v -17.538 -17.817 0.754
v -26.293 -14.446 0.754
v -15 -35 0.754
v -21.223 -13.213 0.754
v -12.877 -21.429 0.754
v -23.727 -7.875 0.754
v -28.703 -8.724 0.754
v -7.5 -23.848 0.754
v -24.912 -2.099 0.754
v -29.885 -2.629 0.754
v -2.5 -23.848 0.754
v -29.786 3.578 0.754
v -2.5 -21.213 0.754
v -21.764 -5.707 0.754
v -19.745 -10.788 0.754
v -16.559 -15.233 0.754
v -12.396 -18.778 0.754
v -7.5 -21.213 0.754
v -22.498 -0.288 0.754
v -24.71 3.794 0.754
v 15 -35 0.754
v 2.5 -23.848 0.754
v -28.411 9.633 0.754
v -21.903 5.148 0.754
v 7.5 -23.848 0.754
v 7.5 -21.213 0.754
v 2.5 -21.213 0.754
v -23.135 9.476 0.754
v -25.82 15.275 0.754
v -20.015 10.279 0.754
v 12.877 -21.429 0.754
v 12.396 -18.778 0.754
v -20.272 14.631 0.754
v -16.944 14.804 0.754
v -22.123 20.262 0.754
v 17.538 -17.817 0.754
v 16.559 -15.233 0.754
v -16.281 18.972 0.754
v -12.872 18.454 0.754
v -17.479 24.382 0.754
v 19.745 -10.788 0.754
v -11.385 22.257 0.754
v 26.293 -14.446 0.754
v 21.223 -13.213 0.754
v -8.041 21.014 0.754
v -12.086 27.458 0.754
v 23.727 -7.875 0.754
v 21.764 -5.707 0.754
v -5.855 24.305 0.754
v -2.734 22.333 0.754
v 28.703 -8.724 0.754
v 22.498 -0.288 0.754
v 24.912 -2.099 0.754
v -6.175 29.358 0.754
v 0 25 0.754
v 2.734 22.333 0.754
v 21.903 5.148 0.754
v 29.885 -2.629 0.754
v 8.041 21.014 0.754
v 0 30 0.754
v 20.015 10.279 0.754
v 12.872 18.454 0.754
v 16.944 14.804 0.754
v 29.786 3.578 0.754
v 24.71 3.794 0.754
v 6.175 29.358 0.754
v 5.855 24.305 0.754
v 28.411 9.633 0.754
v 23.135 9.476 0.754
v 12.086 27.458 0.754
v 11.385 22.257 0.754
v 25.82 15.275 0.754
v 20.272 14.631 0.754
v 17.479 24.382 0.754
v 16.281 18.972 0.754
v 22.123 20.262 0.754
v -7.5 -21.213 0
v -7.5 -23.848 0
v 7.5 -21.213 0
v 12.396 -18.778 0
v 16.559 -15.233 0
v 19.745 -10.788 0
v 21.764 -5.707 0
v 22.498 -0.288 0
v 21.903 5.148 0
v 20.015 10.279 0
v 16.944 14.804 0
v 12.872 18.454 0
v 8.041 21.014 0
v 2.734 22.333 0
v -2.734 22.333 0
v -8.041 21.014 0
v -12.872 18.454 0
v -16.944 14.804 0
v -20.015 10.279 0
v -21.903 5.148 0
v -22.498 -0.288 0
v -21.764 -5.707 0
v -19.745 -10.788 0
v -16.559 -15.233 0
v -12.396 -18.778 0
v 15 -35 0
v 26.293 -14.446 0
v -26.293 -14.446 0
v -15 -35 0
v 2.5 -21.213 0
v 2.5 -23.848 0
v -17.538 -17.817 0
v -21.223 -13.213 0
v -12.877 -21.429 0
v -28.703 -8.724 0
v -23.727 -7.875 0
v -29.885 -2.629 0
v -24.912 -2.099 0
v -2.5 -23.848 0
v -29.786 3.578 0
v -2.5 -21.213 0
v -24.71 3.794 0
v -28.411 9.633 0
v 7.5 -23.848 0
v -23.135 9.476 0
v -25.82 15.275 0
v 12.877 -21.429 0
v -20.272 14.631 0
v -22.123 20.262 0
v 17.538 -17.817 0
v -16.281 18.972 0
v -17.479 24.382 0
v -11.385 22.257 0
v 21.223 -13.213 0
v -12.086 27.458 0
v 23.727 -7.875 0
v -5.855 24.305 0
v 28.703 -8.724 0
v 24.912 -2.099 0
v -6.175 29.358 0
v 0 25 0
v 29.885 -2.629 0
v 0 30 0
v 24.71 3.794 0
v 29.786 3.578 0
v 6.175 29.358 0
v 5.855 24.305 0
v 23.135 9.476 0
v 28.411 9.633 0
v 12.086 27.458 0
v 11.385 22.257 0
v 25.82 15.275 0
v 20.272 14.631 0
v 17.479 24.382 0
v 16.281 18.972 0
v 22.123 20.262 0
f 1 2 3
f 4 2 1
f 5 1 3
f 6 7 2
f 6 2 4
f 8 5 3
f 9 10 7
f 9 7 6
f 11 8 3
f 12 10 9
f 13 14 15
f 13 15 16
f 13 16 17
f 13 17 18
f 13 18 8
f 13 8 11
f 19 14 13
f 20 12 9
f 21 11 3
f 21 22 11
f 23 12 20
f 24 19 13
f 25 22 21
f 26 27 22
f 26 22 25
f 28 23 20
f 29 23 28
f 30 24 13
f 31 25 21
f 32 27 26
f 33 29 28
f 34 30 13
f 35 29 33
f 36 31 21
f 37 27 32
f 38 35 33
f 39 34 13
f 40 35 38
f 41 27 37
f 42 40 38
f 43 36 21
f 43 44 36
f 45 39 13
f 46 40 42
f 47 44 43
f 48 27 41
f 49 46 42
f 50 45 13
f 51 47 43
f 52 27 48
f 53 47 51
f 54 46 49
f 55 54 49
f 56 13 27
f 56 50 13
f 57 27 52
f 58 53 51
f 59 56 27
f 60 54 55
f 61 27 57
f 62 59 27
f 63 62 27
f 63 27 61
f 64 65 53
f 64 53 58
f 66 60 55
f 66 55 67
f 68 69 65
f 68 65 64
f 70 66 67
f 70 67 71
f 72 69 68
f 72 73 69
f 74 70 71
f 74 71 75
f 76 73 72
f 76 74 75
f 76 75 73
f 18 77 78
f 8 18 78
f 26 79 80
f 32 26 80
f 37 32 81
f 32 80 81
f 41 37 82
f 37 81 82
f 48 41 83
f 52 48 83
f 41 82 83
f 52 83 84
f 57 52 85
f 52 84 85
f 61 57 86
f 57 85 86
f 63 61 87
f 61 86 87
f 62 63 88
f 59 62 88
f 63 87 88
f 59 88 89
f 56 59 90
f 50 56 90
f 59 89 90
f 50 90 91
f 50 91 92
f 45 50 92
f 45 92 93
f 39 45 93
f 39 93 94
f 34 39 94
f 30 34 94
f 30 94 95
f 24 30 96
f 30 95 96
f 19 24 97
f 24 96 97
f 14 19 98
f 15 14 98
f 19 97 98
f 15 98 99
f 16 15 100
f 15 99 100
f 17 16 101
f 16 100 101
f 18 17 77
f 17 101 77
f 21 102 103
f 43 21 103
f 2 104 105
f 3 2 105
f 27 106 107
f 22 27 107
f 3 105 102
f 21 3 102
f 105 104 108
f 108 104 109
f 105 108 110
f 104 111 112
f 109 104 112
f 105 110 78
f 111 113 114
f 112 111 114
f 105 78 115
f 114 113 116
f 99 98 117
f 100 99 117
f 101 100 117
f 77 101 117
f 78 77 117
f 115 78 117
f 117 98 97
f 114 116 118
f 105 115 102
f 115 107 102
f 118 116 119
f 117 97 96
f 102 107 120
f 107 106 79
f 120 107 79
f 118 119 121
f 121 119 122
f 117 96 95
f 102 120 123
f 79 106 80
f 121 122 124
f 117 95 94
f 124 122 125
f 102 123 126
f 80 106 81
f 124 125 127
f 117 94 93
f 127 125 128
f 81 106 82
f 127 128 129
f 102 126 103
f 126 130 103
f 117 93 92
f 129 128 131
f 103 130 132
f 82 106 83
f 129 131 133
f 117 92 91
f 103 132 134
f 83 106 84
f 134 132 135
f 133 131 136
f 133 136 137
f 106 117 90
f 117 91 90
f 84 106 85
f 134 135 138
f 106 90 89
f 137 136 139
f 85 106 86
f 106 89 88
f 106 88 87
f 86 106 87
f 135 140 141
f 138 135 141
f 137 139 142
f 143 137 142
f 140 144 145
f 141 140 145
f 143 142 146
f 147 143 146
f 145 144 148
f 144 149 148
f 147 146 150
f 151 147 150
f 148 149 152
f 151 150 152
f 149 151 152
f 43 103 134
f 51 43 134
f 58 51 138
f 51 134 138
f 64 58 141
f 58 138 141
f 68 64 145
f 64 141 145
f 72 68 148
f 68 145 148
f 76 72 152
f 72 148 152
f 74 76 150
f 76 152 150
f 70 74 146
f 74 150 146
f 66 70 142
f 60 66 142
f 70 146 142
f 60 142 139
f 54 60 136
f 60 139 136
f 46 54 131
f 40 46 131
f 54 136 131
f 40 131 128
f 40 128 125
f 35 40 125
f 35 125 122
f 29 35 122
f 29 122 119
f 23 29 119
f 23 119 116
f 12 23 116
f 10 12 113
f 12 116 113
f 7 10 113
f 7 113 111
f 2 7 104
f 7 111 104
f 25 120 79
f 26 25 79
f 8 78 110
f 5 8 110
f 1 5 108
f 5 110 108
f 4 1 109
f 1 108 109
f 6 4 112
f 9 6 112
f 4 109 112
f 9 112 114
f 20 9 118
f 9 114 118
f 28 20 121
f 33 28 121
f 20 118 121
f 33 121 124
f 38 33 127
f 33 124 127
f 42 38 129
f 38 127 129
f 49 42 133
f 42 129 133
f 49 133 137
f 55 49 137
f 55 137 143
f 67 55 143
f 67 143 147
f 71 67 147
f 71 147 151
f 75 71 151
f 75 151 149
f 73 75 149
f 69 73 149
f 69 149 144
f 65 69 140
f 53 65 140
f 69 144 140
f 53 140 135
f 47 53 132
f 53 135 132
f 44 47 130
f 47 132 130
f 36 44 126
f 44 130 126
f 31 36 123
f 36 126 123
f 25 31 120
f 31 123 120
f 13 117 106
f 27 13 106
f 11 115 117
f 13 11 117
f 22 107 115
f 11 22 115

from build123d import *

# Parameters (mm, degrees)
BOSS_EXTRUDE1_DEPTH = 0.75438


with BuildPart() as part:
    # Sketch1 → Boss-Extrude1 (new body)
    with BuildSketch(Plane.XY):
        with BuildLine():
            Line((-26.292884648, -14.44590658), (-15, -35))
            Line((-15, -35), (-7.5, -35))
            Line((-7.5, -35), (15, -35))
            Line((15, -35), (26.292884648, -14.44590658))
            ThreePointArc((26.292884648, -14.44590658), (0, 30), (-26.292884648, -14.44590658))
        make_face()
        Polygon((2.5, -23.848480035), (-2.5, -23.848480035), (-2.5, -22.360679775), (-2.5, -21.213203436), (2.5, -21.213203436), (2.5, -22.360679775), align=None, mode=Mode.SUBTRACT)
        with BuildLine():
            Line((-7.5, -21.213203436), (-7.5, -23.848480035))
            ThreePointArc((-7.5, -23.848480035), (0, 25), (7.5, -23.848480035))
            Line((7.5, -23.848480035), (7.5, -21.213203436))
            ThreePointArc((7.5, -21.213203436), (0, 22.5), (-7.5, -21.213203436))
        make_face(mode=Mode.SUBTRACT)
    extrude(amount=BOSS_EXTRUDE1_DEPTH)


solid = part.part
